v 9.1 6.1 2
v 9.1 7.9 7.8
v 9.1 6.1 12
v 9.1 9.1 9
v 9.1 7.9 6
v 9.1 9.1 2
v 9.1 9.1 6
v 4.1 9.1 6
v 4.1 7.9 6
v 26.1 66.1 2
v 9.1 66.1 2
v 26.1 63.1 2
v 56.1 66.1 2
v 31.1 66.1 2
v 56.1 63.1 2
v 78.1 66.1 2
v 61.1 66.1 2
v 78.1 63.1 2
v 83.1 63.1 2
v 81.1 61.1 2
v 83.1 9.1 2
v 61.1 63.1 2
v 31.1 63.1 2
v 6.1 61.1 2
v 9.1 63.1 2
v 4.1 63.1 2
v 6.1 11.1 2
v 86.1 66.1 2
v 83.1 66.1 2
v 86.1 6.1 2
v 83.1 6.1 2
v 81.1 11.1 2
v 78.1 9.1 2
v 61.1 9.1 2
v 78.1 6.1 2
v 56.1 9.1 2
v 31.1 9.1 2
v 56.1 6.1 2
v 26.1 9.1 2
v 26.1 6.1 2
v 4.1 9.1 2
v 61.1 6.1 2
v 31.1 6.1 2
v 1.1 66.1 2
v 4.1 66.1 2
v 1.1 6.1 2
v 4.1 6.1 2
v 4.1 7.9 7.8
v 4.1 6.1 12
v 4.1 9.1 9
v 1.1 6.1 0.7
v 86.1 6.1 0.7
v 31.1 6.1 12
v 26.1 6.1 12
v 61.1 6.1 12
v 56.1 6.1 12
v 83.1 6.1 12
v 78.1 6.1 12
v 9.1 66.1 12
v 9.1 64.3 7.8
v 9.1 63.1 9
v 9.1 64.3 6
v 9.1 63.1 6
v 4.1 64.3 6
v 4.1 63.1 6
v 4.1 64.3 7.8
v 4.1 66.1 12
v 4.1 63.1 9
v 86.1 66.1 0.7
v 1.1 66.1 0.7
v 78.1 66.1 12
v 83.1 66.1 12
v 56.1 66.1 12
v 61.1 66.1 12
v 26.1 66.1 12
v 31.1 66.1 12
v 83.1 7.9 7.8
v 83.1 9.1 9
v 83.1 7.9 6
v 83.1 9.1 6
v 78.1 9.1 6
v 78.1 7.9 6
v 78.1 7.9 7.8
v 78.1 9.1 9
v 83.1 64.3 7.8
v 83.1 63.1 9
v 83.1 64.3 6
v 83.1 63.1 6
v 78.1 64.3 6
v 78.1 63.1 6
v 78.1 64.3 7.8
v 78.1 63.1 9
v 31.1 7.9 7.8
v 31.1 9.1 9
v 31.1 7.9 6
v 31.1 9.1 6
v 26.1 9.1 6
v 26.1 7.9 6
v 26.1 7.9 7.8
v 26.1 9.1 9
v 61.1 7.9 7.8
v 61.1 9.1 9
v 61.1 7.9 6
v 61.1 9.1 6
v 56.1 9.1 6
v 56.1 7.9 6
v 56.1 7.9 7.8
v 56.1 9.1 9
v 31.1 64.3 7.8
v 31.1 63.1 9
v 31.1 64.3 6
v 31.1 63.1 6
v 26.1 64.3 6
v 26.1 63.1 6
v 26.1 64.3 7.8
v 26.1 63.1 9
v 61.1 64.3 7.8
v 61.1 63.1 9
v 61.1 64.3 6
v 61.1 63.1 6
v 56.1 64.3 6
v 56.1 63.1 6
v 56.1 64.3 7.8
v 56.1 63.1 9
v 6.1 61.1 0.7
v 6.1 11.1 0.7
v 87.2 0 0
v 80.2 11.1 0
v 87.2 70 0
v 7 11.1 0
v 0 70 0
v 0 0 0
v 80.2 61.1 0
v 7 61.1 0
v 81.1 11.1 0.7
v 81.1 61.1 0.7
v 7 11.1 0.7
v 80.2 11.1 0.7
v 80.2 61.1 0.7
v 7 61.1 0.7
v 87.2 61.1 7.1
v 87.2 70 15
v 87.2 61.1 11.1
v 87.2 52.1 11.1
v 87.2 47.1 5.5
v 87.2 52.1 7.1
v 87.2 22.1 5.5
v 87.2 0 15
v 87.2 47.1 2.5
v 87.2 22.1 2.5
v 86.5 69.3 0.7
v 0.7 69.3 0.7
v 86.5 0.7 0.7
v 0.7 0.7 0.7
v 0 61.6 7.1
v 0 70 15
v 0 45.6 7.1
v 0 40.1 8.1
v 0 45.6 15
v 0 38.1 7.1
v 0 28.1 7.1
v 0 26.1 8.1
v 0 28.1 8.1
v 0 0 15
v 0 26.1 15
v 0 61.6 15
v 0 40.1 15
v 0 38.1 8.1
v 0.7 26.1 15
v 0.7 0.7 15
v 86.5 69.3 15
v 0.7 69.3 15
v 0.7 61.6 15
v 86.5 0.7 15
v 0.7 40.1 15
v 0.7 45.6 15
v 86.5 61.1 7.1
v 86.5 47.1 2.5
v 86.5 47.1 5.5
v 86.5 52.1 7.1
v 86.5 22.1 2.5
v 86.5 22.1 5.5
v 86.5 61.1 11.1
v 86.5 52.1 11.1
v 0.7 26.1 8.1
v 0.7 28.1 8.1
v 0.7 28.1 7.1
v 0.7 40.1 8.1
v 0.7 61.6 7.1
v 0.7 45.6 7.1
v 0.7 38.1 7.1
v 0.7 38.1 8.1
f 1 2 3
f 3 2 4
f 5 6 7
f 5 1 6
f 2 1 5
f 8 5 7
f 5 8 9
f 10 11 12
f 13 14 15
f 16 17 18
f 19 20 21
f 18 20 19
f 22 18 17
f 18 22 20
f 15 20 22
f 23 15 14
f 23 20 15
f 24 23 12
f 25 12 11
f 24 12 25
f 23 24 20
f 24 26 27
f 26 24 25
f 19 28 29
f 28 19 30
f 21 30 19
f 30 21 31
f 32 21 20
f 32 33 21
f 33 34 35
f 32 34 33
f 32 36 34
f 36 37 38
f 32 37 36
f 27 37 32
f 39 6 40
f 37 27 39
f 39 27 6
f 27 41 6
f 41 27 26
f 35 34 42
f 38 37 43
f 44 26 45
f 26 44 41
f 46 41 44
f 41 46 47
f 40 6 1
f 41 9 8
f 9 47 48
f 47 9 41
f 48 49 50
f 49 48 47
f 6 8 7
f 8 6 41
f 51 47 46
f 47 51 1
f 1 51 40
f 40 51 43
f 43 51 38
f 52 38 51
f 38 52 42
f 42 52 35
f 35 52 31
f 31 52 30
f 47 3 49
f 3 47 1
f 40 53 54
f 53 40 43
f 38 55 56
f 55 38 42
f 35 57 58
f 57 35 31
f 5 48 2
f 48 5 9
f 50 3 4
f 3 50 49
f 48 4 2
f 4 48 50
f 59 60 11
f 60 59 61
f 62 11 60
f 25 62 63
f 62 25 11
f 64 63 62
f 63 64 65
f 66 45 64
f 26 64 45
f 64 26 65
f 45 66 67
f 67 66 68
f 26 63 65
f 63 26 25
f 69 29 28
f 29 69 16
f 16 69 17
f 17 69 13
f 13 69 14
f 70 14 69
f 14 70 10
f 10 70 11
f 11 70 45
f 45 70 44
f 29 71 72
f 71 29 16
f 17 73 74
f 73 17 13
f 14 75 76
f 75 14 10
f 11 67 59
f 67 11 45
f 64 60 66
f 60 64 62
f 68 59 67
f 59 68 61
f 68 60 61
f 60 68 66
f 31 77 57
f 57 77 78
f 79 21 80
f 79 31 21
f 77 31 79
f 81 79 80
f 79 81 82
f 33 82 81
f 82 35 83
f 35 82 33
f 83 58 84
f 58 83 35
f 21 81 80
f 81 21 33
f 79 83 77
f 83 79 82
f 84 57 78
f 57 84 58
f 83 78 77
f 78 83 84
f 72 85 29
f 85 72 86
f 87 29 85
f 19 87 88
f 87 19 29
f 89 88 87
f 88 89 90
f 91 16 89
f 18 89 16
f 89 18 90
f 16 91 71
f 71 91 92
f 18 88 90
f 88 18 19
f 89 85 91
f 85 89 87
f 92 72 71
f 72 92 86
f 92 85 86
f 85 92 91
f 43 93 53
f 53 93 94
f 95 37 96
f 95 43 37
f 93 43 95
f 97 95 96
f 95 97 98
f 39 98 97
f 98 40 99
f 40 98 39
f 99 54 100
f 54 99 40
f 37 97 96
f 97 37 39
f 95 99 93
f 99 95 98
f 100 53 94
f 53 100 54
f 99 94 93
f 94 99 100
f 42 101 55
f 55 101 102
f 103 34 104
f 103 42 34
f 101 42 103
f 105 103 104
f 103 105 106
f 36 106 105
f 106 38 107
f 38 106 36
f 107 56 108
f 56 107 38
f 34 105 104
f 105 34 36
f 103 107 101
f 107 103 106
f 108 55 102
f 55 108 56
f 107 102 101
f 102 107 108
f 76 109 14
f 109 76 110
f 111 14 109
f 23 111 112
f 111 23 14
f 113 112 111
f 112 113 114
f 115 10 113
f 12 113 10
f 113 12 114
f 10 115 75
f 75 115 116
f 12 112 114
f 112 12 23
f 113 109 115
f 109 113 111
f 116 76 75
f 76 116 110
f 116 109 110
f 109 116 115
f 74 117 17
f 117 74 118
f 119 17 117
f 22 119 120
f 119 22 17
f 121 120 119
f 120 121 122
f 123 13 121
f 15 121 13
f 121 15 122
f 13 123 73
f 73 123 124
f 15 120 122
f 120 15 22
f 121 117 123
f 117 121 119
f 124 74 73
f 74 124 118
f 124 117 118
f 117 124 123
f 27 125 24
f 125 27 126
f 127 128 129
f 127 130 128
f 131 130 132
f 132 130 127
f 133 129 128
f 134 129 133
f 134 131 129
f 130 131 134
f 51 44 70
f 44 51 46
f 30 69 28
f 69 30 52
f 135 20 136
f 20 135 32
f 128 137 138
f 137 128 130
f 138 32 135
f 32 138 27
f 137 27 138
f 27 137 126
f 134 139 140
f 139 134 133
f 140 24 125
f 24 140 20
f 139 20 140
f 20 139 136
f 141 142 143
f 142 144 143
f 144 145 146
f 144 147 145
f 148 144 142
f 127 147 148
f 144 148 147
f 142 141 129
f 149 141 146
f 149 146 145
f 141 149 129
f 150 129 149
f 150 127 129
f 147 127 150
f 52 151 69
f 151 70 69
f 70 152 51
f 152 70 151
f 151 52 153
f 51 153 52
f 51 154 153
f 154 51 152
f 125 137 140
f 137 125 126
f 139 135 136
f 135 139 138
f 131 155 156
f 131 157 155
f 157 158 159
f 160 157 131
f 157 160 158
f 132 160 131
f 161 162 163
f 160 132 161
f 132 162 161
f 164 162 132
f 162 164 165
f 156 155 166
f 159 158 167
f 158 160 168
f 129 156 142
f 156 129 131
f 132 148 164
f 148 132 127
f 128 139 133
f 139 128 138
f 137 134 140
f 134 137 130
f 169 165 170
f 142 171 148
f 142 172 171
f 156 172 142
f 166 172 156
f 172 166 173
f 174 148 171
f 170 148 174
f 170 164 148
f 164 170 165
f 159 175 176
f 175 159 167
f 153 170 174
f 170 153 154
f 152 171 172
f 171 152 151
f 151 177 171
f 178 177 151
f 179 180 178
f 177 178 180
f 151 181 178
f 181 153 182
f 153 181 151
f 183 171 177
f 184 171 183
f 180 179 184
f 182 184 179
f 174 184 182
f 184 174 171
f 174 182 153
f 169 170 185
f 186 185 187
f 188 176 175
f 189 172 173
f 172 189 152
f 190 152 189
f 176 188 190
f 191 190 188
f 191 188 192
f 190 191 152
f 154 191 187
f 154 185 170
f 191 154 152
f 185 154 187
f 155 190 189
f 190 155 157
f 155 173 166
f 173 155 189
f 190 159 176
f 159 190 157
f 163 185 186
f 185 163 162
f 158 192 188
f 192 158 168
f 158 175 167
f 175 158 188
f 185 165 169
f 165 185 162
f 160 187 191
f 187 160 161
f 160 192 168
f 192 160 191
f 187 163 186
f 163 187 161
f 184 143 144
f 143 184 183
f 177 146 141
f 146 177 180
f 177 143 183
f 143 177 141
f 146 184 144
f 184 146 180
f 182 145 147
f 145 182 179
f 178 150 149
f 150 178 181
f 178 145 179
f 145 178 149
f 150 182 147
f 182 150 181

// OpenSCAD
// file: pibase.scad
small = 0.1;
peg_bite  =  1.0;
bite_extra = 0.2;  // extra clearance for edge of board
peg_gap   =  2.0;
peg_width =  5.0;
peg_depth =  3.0;
peg_sep   =  56 - 2;
peg_raise =  4.0;

board_x = 85.0;
board_y = 56.0;
board_z =  1.1;

//   _
//  | \
//  |  \
//  |   \
//  |  /
//  |  |
//  |  o-|  <- origin
//  |    |
//  |    |
//  ------
module peg()
{
  extra = 1;

  translate([0, -peg_depth+peg_bite,-peg_raise])
  {
    cube([peg_width,peg_depth,peg_raise], center=false);
  }

  translate([0, -peg_depth+peg_bite,0])
  {
    cube([peg_width,peg_depth-peg_bite-bite_extra,peg_gap+peg_bite+peg_bite], center=false);
  }

  translate([0,-peg_depth+peg_bite+extra-extra,peg_gap])
  {
    //cube([peg_width,peg_depth-peg_bite-extra,peg_bite+extra], center=false);
  }

  peg_dxy = peg_depth;
  polyhedron(
    points = [
      [0, peg_bite, peg_gap+peg_bite],
      [0, peg_bite-peg_dxy, peg_gap+peg_bite-peg_dxy],
      [0, peg_bite-peg_dxy, peg_gap+peg_bite+peg_dxy],
      [peg_width, peg_bite, peg_gap+peg_bite],
      [peg_width, peg_bite-peg_dxy, peg_gap+peg_bite-peg_dxy],
      [peg_width, peg_bite-peg_dxy, peg_gap+peg_bite+peg_dxy],
    ],
    triangles = [ 
      [0,2,1],  // right
      [3,4,5],  // left
      [0,3,2],  // top
      [2,3,5],
      [1,2,4],  // back
      [4,2,5],
      [0,1,3],  // bottom
      [3,1,4]
    ]
  );
}

module front_peg(x)
{
  translate([x,0,0]) 
  {
    peg();
  }
}

module back_peg(x)
{
  translate([x,board_y,0])
  {
    mirror([0,1,0])
    {
      peg();
    }
  }
}


module board()
{
  color([0,1,0]) {
    cube([board_x,board_y,board_z],center=false);
  }
  // ethernet block
  translate([-1,37.5,board_z]) 
  {
    cube([21,16,14.0]);
    translate([-10.0+small,0,0]) cube([10.0,16,14]);  // clearance volume - keep clear
  }

  // usb block
  translate([0,18,board_z]) 
  {
    translate([-7.5,0,1]) cube([18,14,15]);
    translate([-3,2,0]) cube([13,10,1+small]);
  }

  // hdmi block
  translate([board_x-5.0,44.0,board_z])
  {
    cube([6.0,9.0,4.0]);
    translate([6.0-small,0,0]) cube([10.0,9.0,4.0]);  // clearance volume - keep clear
  }

  // SD Card clearance
  translate([board_x-small,14.0,-3.5])
  {
    cube([17.0+small, 25.0, 3.0]);  // clearance volume - keep clear
  }
}

module pair()
{
  foot_height = 2.0;
  foot_x = peg_width;
  foot_y = board_y + (peg_depth-peg_bite) * 2;
  translate([0,-peg_depth+peg_bite,-peg_raise-foot_height])
  {
    cube([foot_x,foot_y,foot_height],center=false);
  }
}

module pibase()
{
  front_peg(3.0);
  back_peg(3.0);
  front_peg(board_x-peg_width-3.0);
  back_peg(board_x-peg_width-3.0);

  pair();
  translate([board_x-peg_width,0,0])
  {
    pair();
  }

  // more pegs

  front_peg(25.0);
  front_peg(board_x-25.0-peg_width);
  back_peg(25.0);
  back_peg(board_x-25.0-peg_width);


  peg3_offet = 25.0;
  
  
  spar_width = peg_width;
  spar_height = 2.0;
  translate([0,-peg_depth+peg_bite,-peg_raise-spar_height]) {
    cube([board_x, spar_width, spar_height]);
  }
  translate([0,board_y-spar_width+peg_depth-peg_bite,-peg_raise-spar_height]) {
    cube([board_x, spar_width, spar_height]);
  }
}

pibase();
%board();
// main file
use <pibase.scad>

small = 0.1;

board_x = 85.0;
board_y = 56.0;

clearance = 0.4;
base_thickness = 0.7;
base_x = board_x + base_thickness*2 + clearance*2;
base_y = 70.0;
base_height = 15.0;

board_dx = base_thickness + clearance;
board_dy = (base_y-board_y)/2 + base_thickness + clearance;
board_dz = 4.0+2.0;

module base_volume()
{
  cube([base_x,base_y,base_height]);
}

module wall(length)
{
  cube([length, base_thickness, base_height]);
}

module floor()
{
  width = 7.0;
  difference() {
    cube([base_x, base_y, base_thickness]);
    translate([width,width,-small]) {
      cube([base_x-width*2, base_y-width*2, base_thickness+small*2]);
    }
  }
}

module walls()
{
  wall(base_x);        
  rotate([0,0,180]) {
    translate([-base_x,-base_y,0]) {
      wall(base_x);
    }
  }
  rotate([0,0,90]) {
    translate([0,-base_x,0]) {
      wall(base_y);
    }
  }
  rotate([0,0,270]) {
    translate([-base_y,0,0]) {
      wall(base_y);
    }
  }
}

module base()
{
  translate([board_dx,board_dy,board_dz]) pibase();
  floor();
  difference() 
  {
    walls();
    translate([board_dx,board_dy,board_dz]) board();
  }
}

translate([board_dx, board_dy, board_dz]) %board();
base();
//%base_volume();
